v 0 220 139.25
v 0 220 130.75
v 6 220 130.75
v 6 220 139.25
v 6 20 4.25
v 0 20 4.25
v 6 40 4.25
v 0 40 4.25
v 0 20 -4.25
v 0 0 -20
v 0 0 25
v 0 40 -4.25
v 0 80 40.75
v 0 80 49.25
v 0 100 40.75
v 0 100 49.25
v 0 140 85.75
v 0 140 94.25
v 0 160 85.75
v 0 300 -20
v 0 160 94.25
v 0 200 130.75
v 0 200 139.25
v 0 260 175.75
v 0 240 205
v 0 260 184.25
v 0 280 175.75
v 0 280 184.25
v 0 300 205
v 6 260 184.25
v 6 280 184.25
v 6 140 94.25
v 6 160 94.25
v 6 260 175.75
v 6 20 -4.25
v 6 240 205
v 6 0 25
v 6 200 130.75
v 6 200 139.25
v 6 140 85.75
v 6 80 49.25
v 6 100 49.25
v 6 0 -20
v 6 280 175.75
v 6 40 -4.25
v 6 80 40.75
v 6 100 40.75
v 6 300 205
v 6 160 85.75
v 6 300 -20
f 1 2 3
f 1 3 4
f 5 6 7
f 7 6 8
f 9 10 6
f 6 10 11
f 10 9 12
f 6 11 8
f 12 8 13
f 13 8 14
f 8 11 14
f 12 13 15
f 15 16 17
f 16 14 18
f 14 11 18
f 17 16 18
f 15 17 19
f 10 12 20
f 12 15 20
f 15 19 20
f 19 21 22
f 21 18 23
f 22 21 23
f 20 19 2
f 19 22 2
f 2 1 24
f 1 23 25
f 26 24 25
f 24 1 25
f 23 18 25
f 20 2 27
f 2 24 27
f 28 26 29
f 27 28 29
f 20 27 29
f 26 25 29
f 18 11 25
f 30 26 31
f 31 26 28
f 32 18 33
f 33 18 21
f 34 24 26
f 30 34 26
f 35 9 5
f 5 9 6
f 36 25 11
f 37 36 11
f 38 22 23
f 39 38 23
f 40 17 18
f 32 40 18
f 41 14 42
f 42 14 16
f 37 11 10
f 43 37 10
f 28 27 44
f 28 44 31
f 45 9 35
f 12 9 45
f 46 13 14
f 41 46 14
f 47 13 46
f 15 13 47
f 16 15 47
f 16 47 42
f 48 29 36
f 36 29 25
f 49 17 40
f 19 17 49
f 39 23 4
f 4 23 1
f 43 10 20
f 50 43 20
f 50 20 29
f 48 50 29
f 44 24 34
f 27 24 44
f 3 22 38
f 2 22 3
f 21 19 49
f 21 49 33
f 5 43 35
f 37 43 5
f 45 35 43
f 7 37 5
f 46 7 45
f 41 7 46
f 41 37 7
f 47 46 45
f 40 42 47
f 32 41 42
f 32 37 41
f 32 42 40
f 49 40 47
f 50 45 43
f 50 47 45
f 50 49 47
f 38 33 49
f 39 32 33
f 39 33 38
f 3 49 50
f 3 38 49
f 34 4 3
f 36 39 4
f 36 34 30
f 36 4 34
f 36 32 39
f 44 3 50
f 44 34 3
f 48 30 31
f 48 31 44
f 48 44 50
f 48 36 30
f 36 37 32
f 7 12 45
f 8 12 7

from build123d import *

# Parameters (mm, degrees)
F0_W     = 20
F0_H     = 8.5
F1_DEPTH = 6


with BuildPart() as f1:
    # F0 (on Right) → F1 (new body)
    with BuildSketch(Plane.YZ):
        Polygon((0, 25), (0, 0), (0, -20), (300, -20), (300, 0), (300, 180), (300, 205), (240, 205), align=None)
        with Locations((30, 0)):
            Rectangle(F0_W, F0_H, mode=Mode.SUBTRACT)
        with Locations((90, 45)):
            Rectangle(F0_W, F0_H, mode=Mode.SUBTRACT)
        with Locations((150, 90)):
            Rectangle(F0_W, F0_H, mode=Mode.SUBTRACT)
        with Locations((210, 135)):
            Rectangle(F0_W, F0_H, mode=Mode.SUBTRACT)
        with Locations((270, 180)):
            Rectangle(F0_W, F0_H, mode=Mode.SUBTRACT)
    extrude(amount=F1_DEPTH)


solid = f1.part
